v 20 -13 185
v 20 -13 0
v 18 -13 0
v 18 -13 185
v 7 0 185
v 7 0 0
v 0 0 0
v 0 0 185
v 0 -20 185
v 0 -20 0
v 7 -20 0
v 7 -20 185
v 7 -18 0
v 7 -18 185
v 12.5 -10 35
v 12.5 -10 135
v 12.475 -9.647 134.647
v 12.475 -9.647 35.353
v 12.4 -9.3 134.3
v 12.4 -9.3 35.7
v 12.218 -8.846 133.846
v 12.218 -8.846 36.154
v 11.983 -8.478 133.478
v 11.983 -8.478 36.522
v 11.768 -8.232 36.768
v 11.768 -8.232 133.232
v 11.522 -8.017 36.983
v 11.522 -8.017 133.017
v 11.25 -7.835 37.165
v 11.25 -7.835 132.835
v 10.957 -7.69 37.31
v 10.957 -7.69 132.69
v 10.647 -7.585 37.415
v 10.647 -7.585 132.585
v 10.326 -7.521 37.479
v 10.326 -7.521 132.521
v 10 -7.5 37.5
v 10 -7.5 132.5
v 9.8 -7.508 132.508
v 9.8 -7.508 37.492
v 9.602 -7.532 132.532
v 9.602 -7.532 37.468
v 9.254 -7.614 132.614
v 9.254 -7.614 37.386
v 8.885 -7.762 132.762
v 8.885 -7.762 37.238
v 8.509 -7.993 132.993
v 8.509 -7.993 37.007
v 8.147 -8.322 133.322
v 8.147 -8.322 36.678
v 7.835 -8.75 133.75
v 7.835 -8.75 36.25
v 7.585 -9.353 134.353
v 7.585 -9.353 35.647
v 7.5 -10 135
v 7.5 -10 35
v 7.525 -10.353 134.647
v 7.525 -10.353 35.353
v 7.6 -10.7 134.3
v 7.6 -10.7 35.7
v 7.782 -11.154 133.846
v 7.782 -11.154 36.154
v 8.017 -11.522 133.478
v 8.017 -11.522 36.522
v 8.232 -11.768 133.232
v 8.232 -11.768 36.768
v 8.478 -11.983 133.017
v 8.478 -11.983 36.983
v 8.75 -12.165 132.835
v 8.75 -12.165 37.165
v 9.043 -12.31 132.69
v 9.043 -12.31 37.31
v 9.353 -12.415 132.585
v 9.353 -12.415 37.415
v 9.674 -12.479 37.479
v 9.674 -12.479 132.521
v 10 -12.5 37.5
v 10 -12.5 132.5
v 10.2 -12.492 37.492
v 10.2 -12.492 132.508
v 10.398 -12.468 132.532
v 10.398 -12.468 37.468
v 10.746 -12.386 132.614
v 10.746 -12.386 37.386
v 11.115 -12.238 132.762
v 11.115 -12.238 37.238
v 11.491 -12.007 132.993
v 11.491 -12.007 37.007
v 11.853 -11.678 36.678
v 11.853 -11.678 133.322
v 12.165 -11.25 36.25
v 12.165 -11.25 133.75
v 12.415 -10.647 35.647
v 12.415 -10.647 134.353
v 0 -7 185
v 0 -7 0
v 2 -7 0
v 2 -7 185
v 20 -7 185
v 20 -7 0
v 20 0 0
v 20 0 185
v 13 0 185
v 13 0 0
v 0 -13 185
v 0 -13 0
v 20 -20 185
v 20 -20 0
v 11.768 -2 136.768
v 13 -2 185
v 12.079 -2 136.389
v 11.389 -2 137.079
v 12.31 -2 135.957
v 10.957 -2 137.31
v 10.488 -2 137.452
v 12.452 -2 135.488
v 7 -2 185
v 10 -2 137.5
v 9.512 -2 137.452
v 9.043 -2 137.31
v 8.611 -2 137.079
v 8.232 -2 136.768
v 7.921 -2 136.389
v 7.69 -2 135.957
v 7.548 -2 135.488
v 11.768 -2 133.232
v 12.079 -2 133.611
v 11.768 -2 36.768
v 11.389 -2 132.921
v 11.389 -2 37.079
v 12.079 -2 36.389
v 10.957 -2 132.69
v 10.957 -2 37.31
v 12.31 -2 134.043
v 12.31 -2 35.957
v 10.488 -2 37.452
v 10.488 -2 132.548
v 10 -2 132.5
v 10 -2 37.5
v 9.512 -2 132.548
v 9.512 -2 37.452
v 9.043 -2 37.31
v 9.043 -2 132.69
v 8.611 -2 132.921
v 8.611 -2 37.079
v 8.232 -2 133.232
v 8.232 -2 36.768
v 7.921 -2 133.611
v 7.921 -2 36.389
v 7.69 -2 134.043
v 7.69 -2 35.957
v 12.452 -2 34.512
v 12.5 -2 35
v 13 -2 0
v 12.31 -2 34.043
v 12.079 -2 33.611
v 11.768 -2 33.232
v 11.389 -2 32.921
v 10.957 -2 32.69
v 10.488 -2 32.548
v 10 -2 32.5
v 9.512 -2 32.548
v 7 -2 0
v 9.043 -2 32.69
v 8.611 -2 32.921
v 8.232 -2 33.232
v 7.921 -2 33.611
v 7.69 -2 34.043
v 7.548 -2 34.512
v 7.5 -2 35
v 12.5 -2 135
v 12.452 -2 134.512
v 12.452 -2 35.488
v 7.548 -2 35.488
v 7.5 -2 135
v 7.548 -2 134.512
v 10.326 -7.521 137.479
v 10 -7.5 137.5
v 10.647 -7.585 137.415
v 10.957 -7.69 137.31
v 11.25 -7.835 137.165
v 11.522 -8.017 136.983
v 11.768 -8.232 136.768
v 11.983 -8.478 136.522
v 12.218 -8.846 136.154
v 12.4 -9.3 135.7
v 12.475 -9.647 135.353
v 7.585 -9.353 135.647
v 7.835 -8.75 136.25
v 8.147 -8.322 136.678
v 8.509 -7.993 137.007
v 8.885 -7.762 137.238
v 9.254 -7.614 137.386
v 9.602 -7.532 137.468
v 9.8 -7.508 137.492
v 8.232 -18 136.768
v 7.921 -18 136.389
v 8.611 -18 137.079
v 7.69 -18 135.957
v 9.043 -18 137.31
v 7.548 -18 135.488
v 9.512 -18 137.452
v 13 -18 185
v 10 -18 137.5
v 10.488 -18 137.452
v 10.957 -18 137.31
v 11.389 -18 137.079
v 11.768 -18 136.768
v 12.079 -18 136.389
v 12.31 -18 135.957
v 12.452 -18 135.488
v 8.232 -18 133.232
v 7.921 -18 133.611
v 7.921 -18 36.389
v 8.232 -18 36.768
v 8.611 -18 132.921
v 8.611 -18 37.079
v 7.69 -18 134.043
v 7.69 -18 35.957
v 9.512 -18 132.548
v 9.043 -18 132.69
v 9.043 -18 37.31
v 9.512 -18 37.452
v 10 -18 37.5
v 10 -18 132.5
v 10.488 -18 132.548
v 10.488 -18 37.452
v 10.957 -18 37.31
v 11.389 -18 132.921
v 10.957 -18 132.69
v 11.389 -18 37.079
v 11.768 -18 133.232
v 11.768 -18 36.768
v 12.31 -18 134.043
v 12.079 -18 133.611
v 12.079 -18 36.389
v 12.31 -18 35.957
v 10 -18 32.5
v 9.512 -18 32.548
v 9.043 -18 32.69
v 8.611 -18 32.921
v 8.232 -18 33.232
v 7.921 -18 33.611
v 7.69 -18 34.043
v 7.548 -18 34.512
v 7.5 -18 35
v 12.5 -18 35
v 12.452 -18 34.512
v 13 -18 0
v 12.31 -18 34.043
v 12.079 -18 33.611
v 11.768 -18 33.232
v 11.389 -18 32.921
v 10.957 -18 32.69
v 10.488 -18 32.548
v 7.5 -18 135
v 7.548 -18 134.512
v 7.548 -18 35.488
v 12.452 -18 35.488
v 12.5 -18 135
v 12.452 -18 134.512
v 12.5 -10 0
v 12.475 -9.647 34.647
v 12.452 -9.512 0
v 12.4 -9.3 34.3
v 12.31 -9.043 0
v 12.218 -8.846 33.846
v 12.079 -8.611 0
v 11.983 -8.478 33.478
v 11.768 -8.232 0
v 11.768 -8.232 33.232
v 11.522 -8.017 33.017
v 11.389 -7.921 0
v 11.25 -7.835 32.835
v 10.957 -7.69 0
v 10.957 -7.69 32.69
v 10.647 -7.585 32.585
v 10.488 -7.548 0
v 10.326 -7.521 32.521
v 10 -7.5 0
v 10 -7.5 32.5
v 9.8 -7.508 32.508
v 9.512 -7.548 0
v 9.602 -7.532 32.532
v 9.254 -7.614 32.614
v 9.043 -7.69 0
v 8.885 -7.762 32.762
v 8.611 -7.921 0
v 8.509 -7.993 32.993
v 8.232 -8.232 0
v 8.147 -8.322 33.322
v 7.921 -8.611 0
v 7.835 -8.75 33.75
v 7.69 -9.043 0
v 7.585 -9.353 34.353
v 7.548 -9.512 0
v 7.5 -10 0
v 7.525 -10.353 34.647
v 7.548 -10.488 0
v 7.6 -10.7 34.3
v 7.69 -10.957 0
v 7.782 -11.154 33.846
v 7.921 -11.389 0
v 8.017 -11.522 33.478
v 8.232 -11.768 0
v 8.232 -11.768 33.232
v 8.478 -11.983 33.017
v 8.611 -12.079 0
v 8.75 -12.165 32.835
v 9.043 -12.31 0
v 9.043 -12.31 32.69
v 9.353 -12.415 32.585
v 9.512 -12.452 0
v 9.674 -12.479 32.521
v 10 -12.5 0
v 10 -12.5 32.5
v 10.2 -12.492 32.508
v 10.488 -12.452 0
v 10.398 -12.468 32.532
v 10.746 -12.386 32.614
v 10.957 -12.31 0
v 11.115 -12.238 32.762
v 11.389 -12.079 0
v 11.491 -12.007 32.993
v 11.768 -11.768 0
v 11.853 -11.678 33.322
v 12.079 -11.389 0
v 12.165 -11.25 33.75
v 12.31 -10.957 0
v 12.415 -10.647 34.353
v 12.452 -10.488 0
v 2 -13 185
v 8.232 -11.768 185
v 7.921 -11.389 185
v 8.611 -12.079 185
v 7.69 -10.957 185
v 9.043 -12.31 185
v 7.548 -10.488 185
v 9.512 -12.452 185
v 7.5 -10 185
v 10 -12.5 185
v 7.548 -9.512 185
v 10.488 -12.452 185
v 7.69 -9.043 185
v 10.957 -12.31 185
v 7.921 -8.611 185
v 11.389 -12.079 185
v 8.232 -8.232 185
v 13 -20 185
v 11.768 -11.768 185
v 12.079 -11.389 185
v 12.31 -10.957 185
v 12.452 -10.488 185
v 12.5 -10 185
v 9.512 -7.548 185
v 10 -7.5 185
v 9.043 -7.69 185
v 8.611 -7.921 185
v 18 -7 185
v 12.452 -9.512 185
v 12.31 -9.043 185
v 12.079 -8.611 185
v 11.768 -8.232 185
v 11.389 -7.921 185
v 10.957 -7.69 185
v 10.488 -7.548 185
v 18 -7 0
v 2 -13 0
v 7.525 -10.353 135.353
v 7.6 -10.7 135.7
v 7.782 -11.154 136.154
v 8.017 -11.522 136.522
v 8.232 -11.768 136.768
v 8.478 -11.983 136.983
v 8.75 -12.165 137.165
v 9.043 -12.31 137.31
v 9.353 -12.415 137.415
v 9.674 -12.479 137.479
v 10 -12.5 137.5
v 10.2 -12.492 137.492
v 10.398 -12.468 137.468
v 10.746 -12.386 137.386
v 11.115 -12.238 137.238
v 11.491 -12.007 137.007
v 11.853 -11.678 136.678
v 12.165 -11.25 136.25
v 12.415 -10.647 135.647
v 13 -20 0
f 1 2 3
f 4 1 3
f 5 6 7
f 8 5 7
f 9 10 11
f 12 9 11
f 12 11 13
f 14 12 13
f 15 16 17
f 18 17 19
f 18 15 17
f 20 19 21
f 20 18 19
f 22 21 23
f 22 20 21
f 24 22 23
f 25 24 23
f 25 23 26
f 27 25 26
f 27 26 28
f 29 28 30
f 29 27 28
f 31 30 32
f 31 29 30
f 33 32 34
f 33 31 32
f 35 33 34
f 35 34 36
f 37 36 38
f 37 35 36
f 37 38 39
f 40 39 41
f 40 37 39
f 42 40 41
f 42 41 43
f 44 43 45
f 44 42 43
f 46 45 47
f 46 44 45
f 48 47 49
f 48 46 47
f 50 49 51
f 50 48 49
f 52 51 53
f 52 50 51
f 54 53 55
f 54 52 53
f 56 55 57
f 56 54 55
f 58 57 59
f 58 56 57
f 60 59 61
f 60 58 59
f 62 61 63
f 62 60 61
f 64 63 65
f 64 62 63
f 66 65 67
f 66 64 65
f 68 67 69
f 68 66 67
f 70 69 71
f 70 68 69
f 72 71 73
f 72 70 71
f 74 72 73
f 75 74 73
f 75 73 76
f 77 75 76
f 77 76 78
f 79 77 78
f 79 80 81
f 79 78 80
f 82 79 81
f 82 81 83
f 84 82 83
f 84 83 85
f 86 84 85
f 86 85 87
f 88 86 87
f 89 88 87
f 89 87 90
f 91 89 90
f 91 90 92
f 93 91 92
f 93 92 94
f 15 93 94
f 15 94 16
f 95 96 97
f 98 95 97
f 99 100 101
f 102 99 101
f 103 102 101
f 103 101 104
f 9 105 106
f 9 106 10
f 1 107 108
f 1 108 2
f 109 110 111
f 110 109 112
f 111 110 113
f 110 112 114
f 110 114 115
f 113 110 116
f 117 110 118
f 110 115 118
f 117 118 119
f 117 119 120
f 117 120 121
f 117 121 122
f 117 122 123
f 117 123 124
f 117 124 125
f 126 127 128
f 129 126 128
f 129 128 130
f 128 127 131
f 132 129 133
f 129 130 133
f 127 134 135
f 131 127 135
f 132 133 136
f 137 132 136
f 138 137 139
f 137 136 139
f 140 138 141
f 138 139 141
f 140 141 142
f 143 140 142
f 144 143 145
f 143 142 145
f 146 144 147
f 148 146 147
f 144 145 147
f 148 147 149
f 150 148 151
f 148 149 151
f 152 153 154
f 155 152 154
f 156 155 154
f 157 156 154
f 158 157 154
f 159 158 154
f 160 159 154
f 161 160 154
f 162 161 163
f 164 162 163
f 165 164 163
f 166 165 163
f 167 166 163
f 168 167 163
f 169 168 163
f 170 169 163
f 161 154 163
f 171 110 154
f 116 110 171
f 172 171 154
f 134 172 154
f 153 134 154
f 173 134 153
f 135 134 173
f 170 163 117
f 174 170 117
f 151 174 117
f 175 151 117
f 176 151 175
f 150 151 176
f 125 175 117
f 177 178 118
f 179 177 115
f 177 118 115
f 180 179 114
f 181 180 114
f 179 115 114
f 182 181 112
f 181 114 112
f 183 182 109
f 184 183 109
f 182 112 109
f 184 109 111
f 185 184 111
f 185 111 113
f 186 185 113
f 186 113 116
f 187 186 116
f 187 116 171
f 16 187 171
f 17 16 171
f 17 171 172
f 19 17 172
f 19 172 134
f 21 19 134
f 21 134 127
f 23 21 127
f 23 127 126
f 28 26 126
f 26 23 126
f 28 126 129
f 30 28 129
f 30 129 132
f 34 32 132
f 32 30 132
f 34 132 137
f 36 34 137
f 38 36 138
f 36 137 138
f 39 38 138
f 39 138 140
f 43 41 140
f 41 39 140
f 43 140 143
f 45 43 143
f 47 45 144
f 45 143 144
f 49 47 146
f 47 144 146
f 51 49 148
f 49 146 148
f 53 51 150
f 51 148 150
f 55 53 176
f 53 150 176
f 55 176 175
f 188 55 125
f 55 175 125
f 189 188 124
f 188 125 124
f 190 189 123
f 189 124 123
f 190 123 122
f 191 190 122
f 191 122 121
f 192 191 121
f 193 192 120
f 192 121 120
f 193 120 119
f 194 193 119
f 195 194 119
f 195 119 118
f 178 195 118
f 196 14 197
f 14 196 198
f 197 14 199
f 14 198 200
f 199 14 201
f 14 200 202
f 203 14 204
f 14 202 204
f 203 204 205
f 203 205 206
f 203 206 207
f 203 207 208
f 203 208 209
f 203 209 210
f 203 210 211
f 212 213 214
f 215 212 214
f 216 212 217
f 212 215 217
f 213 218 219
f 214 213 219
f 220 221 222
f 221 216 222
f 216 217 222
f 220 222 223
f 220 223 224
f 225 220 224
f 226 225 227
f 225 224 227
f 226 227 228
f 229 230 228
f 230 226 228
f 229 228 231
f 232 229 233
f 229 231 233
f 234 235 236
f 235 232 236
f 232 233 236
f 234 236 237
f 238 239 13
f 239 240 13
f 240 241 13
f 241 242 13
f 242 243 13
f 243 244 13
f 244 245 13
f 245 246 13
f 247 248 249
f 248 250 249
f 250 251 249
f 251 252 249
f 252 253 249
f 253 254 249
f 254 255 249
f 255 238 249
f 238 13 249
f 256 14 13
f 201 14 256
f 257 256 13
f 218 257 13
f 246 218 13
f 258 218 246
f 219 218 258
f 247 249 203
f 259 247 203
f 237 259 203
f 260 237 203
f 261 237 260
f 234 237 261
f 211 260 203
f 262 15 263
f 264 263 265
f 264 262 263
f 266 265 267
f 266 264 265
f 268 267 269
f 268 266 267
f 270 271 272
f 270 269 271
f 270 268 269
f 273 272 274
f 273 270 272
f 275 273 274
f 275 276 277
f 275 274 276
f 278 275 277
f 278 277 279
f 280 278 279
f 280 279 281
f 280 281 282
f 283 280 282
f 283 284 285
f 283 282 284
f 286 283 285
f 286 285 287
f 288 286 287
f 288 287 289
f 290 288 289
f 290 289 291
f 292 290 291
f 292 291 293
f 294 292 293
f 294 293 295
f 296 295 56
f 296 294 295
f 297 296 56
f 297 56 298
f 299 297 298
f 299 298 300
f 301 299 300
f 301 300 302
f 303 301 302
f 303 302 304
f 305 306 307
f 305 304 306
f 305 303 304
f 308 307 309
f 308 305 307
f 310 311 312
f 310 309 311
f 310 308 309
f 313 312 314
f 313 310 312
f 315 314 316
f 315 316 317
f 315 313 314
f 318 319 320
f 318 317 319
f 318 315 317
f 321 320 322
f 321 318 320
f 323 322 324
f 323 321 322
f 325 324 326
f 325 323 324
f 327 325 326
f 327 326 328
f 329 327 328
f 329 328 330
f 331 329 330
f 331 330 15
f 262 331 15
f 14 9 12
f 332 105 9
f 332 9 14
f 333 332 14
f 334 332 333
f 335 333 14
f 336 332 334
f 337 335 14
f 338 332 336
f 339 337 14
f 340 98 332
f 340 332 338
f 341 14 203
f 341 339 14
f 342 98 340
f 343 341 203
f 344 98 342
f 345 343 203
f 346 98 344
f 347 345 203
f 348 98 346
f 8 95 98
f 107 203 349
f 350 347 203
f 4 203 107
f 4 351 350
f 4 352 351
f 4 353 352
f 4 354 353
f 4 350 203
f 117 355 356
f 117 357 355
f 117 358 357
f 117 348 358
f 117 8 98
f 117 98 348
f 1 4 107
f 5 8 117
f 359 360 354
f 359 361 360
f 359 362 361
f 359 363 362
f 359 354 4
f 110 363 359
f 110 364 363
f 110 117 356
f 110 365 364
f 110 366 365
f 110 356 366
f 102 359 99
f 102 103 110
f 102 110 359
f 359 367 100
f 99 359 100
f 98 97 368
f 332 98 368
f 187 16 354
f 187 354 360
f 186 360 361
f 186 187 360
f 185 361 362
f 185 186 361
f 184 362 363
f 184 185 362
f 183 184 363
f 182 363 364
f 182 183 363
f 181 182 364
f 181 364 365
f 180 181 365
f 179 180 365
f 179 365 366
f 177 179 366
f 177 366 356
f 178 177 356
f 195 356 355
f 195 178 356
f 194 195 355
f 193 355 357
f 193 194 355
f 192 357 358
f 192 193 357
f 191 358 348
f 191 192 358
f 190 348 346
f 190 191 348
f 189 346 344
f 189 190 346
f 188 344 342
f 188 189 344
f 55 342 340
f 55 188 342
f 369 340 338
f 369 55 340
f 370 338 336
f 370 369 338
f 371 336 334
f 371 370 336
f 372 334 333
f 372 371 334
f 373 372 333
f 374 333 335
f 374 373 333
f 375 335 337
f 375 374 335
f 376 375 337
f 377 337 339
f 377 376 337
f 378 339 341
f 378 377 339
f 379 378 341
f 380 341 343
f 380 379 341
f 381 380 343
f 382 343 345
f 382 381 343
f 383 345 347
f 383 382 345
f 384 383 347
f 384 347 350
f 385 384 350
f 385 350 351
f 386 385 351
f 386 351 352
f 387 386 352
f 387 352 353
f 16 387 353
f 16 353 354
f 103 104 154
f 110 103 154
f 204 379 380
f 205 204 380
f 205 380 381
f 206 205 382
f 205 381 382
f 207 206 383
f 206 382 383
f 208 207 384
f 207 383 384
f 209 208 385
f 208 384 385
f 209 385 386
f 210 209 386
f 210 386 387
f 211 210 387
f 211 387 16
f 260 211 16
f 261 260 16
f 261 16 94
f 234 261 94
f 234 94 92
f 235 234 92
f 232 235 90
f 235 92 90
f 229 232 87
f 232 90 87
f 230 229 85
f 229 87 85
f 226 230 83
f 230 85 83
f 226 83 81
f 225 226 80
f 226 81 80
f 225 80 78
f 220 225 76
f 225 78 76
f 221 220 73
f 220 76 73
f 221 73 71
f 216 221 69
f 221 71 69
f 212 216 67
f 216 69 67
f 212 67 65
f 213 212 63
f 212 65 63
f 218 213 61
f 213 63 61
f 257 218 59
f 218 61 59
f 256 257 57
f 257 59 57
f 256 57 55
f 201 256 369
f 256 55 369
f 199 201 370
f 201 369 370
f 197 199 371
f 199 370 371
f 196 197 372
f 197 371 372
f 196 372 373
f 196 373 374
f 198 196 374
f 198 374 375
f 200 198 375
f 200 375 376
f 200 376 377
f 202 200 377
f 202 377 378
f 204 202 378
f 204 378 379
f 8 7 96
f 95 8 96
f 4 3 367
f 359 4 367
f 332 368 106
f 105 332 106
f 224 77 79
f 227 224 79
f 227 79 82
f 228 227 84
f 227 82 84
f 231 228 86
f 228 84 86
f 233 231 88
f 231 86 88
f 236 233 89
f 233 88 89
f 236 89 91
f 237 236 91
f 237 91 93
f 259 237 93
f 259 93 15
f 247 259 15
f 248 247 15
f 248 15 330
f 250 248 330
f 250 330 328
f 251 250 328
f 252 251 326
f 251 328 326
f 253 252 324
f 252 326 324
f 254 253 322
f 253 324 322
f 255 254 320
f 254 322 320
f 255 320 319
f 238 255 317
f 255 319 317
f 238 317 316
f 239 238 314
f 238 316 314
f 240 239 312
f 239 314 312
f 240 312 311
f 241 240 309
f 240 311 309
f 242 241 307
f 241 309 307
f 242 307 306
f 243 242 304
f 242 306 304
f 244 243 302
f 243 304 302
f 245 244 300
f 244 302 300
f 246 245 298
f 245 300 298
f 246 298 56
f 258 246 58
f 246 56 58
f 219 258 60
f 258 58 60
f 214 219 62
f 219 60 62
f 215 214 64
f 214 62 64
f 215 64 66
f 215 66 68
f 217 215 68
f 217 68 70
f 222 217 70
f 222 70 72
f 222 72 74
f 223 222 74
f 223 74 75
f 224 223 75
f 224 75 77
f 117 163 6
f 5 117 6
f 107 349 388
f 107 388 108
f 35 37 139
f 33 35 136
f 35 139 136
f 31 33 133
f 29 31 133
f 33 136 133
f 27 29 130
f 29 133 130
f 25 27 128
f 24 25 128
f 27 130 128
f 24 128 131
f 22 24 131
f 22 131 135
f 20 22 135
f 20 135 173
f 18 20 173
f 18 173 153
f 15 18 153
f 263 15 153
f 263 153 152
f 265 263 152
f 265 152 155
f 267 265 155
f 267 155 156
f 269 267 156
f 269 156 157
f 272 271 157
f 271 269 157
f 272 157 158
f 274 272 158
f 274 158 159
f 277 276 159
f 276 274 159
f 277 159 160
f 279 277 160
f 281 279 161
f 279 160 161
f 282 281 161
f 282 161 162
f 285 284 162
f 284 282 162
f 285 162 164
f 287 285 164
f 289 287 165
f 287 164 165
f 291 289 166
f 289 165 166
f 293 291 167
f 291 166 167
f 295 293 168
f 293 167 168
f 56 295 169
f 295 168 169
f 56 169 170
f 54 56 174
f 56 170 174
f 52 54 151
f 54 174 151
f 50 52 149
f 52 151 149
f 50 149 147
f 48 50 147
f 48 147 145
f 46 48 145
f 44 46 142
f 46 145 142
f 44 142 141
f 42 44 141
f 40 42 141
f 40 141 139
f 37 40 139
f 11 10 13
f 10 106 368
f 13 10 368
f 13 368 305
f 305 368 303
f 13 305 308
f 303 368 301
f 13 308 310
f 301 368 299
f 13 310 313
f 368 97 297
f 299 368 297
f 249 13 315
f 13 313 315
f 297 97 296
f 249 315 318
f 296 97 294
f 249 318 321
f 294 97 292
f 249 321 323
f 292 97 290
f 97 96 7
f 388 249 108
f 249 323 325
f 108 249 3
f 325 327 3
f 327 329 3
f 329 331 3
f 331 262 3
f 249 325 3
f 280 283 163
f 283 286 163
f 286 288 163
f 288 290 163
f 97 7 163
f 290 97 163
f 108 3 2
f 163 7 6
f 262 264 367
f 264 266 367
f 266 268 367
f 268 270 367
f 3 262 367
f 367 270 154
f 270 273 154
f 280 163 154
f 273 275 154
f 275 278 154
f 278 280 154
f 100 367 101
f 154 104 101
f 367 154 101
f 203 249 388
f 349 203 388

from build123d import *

# Parameters (mm, degrees)
SKETCH_1_R          = 2.5
EXTRUDE_1_DEPTH     = 185
SKETCH_2_R          = 2.5
CUT_EXTRUDE_1_DEPTH = 188.149672722


with BuildPart() as part:
    # 草图1 → 凸台-拉伸1 (new body)
    with BuildSketch(Plane.XY):
        Polygon((0, -13), (0, -20), (7, -20), (7, -18), (13, -18), (13, -20), (20, -20), (20, -13), (18, -13), (18, -7), (20, -7), (20, 0), (13, 0), (13, -2), (7, -2), (7, 0), (0, 0), (0, -7), (2, -7), (2, -13), align=None)
        with Locations((10, -10)):
            Circle(SKETCH_1_R, mode=Mode.SUBTRACT)
    extrude(amount=EXTRUDE_1_DEPTH)

    # 草图2 → 切除-拉伸1 (cut, through all)
    with BuildSketch(Plane(origin=(0, 0, 0), x_dir=(1, 0, 0), z_dir=(0, 1, 0))):
        with Locations(Location((10, -35, 0), (0, 0, 270))):
            Circle(SKETCH_2_R)
        with Locations(Location((10, -135, 0), (0, 0, 270))):
            Circle(SKETCH_2_R)
    extrude(amount=-CUT_EXTRUDE_1_DEPTH, mode=Mode.SUBTRACT)


solid = part.part
